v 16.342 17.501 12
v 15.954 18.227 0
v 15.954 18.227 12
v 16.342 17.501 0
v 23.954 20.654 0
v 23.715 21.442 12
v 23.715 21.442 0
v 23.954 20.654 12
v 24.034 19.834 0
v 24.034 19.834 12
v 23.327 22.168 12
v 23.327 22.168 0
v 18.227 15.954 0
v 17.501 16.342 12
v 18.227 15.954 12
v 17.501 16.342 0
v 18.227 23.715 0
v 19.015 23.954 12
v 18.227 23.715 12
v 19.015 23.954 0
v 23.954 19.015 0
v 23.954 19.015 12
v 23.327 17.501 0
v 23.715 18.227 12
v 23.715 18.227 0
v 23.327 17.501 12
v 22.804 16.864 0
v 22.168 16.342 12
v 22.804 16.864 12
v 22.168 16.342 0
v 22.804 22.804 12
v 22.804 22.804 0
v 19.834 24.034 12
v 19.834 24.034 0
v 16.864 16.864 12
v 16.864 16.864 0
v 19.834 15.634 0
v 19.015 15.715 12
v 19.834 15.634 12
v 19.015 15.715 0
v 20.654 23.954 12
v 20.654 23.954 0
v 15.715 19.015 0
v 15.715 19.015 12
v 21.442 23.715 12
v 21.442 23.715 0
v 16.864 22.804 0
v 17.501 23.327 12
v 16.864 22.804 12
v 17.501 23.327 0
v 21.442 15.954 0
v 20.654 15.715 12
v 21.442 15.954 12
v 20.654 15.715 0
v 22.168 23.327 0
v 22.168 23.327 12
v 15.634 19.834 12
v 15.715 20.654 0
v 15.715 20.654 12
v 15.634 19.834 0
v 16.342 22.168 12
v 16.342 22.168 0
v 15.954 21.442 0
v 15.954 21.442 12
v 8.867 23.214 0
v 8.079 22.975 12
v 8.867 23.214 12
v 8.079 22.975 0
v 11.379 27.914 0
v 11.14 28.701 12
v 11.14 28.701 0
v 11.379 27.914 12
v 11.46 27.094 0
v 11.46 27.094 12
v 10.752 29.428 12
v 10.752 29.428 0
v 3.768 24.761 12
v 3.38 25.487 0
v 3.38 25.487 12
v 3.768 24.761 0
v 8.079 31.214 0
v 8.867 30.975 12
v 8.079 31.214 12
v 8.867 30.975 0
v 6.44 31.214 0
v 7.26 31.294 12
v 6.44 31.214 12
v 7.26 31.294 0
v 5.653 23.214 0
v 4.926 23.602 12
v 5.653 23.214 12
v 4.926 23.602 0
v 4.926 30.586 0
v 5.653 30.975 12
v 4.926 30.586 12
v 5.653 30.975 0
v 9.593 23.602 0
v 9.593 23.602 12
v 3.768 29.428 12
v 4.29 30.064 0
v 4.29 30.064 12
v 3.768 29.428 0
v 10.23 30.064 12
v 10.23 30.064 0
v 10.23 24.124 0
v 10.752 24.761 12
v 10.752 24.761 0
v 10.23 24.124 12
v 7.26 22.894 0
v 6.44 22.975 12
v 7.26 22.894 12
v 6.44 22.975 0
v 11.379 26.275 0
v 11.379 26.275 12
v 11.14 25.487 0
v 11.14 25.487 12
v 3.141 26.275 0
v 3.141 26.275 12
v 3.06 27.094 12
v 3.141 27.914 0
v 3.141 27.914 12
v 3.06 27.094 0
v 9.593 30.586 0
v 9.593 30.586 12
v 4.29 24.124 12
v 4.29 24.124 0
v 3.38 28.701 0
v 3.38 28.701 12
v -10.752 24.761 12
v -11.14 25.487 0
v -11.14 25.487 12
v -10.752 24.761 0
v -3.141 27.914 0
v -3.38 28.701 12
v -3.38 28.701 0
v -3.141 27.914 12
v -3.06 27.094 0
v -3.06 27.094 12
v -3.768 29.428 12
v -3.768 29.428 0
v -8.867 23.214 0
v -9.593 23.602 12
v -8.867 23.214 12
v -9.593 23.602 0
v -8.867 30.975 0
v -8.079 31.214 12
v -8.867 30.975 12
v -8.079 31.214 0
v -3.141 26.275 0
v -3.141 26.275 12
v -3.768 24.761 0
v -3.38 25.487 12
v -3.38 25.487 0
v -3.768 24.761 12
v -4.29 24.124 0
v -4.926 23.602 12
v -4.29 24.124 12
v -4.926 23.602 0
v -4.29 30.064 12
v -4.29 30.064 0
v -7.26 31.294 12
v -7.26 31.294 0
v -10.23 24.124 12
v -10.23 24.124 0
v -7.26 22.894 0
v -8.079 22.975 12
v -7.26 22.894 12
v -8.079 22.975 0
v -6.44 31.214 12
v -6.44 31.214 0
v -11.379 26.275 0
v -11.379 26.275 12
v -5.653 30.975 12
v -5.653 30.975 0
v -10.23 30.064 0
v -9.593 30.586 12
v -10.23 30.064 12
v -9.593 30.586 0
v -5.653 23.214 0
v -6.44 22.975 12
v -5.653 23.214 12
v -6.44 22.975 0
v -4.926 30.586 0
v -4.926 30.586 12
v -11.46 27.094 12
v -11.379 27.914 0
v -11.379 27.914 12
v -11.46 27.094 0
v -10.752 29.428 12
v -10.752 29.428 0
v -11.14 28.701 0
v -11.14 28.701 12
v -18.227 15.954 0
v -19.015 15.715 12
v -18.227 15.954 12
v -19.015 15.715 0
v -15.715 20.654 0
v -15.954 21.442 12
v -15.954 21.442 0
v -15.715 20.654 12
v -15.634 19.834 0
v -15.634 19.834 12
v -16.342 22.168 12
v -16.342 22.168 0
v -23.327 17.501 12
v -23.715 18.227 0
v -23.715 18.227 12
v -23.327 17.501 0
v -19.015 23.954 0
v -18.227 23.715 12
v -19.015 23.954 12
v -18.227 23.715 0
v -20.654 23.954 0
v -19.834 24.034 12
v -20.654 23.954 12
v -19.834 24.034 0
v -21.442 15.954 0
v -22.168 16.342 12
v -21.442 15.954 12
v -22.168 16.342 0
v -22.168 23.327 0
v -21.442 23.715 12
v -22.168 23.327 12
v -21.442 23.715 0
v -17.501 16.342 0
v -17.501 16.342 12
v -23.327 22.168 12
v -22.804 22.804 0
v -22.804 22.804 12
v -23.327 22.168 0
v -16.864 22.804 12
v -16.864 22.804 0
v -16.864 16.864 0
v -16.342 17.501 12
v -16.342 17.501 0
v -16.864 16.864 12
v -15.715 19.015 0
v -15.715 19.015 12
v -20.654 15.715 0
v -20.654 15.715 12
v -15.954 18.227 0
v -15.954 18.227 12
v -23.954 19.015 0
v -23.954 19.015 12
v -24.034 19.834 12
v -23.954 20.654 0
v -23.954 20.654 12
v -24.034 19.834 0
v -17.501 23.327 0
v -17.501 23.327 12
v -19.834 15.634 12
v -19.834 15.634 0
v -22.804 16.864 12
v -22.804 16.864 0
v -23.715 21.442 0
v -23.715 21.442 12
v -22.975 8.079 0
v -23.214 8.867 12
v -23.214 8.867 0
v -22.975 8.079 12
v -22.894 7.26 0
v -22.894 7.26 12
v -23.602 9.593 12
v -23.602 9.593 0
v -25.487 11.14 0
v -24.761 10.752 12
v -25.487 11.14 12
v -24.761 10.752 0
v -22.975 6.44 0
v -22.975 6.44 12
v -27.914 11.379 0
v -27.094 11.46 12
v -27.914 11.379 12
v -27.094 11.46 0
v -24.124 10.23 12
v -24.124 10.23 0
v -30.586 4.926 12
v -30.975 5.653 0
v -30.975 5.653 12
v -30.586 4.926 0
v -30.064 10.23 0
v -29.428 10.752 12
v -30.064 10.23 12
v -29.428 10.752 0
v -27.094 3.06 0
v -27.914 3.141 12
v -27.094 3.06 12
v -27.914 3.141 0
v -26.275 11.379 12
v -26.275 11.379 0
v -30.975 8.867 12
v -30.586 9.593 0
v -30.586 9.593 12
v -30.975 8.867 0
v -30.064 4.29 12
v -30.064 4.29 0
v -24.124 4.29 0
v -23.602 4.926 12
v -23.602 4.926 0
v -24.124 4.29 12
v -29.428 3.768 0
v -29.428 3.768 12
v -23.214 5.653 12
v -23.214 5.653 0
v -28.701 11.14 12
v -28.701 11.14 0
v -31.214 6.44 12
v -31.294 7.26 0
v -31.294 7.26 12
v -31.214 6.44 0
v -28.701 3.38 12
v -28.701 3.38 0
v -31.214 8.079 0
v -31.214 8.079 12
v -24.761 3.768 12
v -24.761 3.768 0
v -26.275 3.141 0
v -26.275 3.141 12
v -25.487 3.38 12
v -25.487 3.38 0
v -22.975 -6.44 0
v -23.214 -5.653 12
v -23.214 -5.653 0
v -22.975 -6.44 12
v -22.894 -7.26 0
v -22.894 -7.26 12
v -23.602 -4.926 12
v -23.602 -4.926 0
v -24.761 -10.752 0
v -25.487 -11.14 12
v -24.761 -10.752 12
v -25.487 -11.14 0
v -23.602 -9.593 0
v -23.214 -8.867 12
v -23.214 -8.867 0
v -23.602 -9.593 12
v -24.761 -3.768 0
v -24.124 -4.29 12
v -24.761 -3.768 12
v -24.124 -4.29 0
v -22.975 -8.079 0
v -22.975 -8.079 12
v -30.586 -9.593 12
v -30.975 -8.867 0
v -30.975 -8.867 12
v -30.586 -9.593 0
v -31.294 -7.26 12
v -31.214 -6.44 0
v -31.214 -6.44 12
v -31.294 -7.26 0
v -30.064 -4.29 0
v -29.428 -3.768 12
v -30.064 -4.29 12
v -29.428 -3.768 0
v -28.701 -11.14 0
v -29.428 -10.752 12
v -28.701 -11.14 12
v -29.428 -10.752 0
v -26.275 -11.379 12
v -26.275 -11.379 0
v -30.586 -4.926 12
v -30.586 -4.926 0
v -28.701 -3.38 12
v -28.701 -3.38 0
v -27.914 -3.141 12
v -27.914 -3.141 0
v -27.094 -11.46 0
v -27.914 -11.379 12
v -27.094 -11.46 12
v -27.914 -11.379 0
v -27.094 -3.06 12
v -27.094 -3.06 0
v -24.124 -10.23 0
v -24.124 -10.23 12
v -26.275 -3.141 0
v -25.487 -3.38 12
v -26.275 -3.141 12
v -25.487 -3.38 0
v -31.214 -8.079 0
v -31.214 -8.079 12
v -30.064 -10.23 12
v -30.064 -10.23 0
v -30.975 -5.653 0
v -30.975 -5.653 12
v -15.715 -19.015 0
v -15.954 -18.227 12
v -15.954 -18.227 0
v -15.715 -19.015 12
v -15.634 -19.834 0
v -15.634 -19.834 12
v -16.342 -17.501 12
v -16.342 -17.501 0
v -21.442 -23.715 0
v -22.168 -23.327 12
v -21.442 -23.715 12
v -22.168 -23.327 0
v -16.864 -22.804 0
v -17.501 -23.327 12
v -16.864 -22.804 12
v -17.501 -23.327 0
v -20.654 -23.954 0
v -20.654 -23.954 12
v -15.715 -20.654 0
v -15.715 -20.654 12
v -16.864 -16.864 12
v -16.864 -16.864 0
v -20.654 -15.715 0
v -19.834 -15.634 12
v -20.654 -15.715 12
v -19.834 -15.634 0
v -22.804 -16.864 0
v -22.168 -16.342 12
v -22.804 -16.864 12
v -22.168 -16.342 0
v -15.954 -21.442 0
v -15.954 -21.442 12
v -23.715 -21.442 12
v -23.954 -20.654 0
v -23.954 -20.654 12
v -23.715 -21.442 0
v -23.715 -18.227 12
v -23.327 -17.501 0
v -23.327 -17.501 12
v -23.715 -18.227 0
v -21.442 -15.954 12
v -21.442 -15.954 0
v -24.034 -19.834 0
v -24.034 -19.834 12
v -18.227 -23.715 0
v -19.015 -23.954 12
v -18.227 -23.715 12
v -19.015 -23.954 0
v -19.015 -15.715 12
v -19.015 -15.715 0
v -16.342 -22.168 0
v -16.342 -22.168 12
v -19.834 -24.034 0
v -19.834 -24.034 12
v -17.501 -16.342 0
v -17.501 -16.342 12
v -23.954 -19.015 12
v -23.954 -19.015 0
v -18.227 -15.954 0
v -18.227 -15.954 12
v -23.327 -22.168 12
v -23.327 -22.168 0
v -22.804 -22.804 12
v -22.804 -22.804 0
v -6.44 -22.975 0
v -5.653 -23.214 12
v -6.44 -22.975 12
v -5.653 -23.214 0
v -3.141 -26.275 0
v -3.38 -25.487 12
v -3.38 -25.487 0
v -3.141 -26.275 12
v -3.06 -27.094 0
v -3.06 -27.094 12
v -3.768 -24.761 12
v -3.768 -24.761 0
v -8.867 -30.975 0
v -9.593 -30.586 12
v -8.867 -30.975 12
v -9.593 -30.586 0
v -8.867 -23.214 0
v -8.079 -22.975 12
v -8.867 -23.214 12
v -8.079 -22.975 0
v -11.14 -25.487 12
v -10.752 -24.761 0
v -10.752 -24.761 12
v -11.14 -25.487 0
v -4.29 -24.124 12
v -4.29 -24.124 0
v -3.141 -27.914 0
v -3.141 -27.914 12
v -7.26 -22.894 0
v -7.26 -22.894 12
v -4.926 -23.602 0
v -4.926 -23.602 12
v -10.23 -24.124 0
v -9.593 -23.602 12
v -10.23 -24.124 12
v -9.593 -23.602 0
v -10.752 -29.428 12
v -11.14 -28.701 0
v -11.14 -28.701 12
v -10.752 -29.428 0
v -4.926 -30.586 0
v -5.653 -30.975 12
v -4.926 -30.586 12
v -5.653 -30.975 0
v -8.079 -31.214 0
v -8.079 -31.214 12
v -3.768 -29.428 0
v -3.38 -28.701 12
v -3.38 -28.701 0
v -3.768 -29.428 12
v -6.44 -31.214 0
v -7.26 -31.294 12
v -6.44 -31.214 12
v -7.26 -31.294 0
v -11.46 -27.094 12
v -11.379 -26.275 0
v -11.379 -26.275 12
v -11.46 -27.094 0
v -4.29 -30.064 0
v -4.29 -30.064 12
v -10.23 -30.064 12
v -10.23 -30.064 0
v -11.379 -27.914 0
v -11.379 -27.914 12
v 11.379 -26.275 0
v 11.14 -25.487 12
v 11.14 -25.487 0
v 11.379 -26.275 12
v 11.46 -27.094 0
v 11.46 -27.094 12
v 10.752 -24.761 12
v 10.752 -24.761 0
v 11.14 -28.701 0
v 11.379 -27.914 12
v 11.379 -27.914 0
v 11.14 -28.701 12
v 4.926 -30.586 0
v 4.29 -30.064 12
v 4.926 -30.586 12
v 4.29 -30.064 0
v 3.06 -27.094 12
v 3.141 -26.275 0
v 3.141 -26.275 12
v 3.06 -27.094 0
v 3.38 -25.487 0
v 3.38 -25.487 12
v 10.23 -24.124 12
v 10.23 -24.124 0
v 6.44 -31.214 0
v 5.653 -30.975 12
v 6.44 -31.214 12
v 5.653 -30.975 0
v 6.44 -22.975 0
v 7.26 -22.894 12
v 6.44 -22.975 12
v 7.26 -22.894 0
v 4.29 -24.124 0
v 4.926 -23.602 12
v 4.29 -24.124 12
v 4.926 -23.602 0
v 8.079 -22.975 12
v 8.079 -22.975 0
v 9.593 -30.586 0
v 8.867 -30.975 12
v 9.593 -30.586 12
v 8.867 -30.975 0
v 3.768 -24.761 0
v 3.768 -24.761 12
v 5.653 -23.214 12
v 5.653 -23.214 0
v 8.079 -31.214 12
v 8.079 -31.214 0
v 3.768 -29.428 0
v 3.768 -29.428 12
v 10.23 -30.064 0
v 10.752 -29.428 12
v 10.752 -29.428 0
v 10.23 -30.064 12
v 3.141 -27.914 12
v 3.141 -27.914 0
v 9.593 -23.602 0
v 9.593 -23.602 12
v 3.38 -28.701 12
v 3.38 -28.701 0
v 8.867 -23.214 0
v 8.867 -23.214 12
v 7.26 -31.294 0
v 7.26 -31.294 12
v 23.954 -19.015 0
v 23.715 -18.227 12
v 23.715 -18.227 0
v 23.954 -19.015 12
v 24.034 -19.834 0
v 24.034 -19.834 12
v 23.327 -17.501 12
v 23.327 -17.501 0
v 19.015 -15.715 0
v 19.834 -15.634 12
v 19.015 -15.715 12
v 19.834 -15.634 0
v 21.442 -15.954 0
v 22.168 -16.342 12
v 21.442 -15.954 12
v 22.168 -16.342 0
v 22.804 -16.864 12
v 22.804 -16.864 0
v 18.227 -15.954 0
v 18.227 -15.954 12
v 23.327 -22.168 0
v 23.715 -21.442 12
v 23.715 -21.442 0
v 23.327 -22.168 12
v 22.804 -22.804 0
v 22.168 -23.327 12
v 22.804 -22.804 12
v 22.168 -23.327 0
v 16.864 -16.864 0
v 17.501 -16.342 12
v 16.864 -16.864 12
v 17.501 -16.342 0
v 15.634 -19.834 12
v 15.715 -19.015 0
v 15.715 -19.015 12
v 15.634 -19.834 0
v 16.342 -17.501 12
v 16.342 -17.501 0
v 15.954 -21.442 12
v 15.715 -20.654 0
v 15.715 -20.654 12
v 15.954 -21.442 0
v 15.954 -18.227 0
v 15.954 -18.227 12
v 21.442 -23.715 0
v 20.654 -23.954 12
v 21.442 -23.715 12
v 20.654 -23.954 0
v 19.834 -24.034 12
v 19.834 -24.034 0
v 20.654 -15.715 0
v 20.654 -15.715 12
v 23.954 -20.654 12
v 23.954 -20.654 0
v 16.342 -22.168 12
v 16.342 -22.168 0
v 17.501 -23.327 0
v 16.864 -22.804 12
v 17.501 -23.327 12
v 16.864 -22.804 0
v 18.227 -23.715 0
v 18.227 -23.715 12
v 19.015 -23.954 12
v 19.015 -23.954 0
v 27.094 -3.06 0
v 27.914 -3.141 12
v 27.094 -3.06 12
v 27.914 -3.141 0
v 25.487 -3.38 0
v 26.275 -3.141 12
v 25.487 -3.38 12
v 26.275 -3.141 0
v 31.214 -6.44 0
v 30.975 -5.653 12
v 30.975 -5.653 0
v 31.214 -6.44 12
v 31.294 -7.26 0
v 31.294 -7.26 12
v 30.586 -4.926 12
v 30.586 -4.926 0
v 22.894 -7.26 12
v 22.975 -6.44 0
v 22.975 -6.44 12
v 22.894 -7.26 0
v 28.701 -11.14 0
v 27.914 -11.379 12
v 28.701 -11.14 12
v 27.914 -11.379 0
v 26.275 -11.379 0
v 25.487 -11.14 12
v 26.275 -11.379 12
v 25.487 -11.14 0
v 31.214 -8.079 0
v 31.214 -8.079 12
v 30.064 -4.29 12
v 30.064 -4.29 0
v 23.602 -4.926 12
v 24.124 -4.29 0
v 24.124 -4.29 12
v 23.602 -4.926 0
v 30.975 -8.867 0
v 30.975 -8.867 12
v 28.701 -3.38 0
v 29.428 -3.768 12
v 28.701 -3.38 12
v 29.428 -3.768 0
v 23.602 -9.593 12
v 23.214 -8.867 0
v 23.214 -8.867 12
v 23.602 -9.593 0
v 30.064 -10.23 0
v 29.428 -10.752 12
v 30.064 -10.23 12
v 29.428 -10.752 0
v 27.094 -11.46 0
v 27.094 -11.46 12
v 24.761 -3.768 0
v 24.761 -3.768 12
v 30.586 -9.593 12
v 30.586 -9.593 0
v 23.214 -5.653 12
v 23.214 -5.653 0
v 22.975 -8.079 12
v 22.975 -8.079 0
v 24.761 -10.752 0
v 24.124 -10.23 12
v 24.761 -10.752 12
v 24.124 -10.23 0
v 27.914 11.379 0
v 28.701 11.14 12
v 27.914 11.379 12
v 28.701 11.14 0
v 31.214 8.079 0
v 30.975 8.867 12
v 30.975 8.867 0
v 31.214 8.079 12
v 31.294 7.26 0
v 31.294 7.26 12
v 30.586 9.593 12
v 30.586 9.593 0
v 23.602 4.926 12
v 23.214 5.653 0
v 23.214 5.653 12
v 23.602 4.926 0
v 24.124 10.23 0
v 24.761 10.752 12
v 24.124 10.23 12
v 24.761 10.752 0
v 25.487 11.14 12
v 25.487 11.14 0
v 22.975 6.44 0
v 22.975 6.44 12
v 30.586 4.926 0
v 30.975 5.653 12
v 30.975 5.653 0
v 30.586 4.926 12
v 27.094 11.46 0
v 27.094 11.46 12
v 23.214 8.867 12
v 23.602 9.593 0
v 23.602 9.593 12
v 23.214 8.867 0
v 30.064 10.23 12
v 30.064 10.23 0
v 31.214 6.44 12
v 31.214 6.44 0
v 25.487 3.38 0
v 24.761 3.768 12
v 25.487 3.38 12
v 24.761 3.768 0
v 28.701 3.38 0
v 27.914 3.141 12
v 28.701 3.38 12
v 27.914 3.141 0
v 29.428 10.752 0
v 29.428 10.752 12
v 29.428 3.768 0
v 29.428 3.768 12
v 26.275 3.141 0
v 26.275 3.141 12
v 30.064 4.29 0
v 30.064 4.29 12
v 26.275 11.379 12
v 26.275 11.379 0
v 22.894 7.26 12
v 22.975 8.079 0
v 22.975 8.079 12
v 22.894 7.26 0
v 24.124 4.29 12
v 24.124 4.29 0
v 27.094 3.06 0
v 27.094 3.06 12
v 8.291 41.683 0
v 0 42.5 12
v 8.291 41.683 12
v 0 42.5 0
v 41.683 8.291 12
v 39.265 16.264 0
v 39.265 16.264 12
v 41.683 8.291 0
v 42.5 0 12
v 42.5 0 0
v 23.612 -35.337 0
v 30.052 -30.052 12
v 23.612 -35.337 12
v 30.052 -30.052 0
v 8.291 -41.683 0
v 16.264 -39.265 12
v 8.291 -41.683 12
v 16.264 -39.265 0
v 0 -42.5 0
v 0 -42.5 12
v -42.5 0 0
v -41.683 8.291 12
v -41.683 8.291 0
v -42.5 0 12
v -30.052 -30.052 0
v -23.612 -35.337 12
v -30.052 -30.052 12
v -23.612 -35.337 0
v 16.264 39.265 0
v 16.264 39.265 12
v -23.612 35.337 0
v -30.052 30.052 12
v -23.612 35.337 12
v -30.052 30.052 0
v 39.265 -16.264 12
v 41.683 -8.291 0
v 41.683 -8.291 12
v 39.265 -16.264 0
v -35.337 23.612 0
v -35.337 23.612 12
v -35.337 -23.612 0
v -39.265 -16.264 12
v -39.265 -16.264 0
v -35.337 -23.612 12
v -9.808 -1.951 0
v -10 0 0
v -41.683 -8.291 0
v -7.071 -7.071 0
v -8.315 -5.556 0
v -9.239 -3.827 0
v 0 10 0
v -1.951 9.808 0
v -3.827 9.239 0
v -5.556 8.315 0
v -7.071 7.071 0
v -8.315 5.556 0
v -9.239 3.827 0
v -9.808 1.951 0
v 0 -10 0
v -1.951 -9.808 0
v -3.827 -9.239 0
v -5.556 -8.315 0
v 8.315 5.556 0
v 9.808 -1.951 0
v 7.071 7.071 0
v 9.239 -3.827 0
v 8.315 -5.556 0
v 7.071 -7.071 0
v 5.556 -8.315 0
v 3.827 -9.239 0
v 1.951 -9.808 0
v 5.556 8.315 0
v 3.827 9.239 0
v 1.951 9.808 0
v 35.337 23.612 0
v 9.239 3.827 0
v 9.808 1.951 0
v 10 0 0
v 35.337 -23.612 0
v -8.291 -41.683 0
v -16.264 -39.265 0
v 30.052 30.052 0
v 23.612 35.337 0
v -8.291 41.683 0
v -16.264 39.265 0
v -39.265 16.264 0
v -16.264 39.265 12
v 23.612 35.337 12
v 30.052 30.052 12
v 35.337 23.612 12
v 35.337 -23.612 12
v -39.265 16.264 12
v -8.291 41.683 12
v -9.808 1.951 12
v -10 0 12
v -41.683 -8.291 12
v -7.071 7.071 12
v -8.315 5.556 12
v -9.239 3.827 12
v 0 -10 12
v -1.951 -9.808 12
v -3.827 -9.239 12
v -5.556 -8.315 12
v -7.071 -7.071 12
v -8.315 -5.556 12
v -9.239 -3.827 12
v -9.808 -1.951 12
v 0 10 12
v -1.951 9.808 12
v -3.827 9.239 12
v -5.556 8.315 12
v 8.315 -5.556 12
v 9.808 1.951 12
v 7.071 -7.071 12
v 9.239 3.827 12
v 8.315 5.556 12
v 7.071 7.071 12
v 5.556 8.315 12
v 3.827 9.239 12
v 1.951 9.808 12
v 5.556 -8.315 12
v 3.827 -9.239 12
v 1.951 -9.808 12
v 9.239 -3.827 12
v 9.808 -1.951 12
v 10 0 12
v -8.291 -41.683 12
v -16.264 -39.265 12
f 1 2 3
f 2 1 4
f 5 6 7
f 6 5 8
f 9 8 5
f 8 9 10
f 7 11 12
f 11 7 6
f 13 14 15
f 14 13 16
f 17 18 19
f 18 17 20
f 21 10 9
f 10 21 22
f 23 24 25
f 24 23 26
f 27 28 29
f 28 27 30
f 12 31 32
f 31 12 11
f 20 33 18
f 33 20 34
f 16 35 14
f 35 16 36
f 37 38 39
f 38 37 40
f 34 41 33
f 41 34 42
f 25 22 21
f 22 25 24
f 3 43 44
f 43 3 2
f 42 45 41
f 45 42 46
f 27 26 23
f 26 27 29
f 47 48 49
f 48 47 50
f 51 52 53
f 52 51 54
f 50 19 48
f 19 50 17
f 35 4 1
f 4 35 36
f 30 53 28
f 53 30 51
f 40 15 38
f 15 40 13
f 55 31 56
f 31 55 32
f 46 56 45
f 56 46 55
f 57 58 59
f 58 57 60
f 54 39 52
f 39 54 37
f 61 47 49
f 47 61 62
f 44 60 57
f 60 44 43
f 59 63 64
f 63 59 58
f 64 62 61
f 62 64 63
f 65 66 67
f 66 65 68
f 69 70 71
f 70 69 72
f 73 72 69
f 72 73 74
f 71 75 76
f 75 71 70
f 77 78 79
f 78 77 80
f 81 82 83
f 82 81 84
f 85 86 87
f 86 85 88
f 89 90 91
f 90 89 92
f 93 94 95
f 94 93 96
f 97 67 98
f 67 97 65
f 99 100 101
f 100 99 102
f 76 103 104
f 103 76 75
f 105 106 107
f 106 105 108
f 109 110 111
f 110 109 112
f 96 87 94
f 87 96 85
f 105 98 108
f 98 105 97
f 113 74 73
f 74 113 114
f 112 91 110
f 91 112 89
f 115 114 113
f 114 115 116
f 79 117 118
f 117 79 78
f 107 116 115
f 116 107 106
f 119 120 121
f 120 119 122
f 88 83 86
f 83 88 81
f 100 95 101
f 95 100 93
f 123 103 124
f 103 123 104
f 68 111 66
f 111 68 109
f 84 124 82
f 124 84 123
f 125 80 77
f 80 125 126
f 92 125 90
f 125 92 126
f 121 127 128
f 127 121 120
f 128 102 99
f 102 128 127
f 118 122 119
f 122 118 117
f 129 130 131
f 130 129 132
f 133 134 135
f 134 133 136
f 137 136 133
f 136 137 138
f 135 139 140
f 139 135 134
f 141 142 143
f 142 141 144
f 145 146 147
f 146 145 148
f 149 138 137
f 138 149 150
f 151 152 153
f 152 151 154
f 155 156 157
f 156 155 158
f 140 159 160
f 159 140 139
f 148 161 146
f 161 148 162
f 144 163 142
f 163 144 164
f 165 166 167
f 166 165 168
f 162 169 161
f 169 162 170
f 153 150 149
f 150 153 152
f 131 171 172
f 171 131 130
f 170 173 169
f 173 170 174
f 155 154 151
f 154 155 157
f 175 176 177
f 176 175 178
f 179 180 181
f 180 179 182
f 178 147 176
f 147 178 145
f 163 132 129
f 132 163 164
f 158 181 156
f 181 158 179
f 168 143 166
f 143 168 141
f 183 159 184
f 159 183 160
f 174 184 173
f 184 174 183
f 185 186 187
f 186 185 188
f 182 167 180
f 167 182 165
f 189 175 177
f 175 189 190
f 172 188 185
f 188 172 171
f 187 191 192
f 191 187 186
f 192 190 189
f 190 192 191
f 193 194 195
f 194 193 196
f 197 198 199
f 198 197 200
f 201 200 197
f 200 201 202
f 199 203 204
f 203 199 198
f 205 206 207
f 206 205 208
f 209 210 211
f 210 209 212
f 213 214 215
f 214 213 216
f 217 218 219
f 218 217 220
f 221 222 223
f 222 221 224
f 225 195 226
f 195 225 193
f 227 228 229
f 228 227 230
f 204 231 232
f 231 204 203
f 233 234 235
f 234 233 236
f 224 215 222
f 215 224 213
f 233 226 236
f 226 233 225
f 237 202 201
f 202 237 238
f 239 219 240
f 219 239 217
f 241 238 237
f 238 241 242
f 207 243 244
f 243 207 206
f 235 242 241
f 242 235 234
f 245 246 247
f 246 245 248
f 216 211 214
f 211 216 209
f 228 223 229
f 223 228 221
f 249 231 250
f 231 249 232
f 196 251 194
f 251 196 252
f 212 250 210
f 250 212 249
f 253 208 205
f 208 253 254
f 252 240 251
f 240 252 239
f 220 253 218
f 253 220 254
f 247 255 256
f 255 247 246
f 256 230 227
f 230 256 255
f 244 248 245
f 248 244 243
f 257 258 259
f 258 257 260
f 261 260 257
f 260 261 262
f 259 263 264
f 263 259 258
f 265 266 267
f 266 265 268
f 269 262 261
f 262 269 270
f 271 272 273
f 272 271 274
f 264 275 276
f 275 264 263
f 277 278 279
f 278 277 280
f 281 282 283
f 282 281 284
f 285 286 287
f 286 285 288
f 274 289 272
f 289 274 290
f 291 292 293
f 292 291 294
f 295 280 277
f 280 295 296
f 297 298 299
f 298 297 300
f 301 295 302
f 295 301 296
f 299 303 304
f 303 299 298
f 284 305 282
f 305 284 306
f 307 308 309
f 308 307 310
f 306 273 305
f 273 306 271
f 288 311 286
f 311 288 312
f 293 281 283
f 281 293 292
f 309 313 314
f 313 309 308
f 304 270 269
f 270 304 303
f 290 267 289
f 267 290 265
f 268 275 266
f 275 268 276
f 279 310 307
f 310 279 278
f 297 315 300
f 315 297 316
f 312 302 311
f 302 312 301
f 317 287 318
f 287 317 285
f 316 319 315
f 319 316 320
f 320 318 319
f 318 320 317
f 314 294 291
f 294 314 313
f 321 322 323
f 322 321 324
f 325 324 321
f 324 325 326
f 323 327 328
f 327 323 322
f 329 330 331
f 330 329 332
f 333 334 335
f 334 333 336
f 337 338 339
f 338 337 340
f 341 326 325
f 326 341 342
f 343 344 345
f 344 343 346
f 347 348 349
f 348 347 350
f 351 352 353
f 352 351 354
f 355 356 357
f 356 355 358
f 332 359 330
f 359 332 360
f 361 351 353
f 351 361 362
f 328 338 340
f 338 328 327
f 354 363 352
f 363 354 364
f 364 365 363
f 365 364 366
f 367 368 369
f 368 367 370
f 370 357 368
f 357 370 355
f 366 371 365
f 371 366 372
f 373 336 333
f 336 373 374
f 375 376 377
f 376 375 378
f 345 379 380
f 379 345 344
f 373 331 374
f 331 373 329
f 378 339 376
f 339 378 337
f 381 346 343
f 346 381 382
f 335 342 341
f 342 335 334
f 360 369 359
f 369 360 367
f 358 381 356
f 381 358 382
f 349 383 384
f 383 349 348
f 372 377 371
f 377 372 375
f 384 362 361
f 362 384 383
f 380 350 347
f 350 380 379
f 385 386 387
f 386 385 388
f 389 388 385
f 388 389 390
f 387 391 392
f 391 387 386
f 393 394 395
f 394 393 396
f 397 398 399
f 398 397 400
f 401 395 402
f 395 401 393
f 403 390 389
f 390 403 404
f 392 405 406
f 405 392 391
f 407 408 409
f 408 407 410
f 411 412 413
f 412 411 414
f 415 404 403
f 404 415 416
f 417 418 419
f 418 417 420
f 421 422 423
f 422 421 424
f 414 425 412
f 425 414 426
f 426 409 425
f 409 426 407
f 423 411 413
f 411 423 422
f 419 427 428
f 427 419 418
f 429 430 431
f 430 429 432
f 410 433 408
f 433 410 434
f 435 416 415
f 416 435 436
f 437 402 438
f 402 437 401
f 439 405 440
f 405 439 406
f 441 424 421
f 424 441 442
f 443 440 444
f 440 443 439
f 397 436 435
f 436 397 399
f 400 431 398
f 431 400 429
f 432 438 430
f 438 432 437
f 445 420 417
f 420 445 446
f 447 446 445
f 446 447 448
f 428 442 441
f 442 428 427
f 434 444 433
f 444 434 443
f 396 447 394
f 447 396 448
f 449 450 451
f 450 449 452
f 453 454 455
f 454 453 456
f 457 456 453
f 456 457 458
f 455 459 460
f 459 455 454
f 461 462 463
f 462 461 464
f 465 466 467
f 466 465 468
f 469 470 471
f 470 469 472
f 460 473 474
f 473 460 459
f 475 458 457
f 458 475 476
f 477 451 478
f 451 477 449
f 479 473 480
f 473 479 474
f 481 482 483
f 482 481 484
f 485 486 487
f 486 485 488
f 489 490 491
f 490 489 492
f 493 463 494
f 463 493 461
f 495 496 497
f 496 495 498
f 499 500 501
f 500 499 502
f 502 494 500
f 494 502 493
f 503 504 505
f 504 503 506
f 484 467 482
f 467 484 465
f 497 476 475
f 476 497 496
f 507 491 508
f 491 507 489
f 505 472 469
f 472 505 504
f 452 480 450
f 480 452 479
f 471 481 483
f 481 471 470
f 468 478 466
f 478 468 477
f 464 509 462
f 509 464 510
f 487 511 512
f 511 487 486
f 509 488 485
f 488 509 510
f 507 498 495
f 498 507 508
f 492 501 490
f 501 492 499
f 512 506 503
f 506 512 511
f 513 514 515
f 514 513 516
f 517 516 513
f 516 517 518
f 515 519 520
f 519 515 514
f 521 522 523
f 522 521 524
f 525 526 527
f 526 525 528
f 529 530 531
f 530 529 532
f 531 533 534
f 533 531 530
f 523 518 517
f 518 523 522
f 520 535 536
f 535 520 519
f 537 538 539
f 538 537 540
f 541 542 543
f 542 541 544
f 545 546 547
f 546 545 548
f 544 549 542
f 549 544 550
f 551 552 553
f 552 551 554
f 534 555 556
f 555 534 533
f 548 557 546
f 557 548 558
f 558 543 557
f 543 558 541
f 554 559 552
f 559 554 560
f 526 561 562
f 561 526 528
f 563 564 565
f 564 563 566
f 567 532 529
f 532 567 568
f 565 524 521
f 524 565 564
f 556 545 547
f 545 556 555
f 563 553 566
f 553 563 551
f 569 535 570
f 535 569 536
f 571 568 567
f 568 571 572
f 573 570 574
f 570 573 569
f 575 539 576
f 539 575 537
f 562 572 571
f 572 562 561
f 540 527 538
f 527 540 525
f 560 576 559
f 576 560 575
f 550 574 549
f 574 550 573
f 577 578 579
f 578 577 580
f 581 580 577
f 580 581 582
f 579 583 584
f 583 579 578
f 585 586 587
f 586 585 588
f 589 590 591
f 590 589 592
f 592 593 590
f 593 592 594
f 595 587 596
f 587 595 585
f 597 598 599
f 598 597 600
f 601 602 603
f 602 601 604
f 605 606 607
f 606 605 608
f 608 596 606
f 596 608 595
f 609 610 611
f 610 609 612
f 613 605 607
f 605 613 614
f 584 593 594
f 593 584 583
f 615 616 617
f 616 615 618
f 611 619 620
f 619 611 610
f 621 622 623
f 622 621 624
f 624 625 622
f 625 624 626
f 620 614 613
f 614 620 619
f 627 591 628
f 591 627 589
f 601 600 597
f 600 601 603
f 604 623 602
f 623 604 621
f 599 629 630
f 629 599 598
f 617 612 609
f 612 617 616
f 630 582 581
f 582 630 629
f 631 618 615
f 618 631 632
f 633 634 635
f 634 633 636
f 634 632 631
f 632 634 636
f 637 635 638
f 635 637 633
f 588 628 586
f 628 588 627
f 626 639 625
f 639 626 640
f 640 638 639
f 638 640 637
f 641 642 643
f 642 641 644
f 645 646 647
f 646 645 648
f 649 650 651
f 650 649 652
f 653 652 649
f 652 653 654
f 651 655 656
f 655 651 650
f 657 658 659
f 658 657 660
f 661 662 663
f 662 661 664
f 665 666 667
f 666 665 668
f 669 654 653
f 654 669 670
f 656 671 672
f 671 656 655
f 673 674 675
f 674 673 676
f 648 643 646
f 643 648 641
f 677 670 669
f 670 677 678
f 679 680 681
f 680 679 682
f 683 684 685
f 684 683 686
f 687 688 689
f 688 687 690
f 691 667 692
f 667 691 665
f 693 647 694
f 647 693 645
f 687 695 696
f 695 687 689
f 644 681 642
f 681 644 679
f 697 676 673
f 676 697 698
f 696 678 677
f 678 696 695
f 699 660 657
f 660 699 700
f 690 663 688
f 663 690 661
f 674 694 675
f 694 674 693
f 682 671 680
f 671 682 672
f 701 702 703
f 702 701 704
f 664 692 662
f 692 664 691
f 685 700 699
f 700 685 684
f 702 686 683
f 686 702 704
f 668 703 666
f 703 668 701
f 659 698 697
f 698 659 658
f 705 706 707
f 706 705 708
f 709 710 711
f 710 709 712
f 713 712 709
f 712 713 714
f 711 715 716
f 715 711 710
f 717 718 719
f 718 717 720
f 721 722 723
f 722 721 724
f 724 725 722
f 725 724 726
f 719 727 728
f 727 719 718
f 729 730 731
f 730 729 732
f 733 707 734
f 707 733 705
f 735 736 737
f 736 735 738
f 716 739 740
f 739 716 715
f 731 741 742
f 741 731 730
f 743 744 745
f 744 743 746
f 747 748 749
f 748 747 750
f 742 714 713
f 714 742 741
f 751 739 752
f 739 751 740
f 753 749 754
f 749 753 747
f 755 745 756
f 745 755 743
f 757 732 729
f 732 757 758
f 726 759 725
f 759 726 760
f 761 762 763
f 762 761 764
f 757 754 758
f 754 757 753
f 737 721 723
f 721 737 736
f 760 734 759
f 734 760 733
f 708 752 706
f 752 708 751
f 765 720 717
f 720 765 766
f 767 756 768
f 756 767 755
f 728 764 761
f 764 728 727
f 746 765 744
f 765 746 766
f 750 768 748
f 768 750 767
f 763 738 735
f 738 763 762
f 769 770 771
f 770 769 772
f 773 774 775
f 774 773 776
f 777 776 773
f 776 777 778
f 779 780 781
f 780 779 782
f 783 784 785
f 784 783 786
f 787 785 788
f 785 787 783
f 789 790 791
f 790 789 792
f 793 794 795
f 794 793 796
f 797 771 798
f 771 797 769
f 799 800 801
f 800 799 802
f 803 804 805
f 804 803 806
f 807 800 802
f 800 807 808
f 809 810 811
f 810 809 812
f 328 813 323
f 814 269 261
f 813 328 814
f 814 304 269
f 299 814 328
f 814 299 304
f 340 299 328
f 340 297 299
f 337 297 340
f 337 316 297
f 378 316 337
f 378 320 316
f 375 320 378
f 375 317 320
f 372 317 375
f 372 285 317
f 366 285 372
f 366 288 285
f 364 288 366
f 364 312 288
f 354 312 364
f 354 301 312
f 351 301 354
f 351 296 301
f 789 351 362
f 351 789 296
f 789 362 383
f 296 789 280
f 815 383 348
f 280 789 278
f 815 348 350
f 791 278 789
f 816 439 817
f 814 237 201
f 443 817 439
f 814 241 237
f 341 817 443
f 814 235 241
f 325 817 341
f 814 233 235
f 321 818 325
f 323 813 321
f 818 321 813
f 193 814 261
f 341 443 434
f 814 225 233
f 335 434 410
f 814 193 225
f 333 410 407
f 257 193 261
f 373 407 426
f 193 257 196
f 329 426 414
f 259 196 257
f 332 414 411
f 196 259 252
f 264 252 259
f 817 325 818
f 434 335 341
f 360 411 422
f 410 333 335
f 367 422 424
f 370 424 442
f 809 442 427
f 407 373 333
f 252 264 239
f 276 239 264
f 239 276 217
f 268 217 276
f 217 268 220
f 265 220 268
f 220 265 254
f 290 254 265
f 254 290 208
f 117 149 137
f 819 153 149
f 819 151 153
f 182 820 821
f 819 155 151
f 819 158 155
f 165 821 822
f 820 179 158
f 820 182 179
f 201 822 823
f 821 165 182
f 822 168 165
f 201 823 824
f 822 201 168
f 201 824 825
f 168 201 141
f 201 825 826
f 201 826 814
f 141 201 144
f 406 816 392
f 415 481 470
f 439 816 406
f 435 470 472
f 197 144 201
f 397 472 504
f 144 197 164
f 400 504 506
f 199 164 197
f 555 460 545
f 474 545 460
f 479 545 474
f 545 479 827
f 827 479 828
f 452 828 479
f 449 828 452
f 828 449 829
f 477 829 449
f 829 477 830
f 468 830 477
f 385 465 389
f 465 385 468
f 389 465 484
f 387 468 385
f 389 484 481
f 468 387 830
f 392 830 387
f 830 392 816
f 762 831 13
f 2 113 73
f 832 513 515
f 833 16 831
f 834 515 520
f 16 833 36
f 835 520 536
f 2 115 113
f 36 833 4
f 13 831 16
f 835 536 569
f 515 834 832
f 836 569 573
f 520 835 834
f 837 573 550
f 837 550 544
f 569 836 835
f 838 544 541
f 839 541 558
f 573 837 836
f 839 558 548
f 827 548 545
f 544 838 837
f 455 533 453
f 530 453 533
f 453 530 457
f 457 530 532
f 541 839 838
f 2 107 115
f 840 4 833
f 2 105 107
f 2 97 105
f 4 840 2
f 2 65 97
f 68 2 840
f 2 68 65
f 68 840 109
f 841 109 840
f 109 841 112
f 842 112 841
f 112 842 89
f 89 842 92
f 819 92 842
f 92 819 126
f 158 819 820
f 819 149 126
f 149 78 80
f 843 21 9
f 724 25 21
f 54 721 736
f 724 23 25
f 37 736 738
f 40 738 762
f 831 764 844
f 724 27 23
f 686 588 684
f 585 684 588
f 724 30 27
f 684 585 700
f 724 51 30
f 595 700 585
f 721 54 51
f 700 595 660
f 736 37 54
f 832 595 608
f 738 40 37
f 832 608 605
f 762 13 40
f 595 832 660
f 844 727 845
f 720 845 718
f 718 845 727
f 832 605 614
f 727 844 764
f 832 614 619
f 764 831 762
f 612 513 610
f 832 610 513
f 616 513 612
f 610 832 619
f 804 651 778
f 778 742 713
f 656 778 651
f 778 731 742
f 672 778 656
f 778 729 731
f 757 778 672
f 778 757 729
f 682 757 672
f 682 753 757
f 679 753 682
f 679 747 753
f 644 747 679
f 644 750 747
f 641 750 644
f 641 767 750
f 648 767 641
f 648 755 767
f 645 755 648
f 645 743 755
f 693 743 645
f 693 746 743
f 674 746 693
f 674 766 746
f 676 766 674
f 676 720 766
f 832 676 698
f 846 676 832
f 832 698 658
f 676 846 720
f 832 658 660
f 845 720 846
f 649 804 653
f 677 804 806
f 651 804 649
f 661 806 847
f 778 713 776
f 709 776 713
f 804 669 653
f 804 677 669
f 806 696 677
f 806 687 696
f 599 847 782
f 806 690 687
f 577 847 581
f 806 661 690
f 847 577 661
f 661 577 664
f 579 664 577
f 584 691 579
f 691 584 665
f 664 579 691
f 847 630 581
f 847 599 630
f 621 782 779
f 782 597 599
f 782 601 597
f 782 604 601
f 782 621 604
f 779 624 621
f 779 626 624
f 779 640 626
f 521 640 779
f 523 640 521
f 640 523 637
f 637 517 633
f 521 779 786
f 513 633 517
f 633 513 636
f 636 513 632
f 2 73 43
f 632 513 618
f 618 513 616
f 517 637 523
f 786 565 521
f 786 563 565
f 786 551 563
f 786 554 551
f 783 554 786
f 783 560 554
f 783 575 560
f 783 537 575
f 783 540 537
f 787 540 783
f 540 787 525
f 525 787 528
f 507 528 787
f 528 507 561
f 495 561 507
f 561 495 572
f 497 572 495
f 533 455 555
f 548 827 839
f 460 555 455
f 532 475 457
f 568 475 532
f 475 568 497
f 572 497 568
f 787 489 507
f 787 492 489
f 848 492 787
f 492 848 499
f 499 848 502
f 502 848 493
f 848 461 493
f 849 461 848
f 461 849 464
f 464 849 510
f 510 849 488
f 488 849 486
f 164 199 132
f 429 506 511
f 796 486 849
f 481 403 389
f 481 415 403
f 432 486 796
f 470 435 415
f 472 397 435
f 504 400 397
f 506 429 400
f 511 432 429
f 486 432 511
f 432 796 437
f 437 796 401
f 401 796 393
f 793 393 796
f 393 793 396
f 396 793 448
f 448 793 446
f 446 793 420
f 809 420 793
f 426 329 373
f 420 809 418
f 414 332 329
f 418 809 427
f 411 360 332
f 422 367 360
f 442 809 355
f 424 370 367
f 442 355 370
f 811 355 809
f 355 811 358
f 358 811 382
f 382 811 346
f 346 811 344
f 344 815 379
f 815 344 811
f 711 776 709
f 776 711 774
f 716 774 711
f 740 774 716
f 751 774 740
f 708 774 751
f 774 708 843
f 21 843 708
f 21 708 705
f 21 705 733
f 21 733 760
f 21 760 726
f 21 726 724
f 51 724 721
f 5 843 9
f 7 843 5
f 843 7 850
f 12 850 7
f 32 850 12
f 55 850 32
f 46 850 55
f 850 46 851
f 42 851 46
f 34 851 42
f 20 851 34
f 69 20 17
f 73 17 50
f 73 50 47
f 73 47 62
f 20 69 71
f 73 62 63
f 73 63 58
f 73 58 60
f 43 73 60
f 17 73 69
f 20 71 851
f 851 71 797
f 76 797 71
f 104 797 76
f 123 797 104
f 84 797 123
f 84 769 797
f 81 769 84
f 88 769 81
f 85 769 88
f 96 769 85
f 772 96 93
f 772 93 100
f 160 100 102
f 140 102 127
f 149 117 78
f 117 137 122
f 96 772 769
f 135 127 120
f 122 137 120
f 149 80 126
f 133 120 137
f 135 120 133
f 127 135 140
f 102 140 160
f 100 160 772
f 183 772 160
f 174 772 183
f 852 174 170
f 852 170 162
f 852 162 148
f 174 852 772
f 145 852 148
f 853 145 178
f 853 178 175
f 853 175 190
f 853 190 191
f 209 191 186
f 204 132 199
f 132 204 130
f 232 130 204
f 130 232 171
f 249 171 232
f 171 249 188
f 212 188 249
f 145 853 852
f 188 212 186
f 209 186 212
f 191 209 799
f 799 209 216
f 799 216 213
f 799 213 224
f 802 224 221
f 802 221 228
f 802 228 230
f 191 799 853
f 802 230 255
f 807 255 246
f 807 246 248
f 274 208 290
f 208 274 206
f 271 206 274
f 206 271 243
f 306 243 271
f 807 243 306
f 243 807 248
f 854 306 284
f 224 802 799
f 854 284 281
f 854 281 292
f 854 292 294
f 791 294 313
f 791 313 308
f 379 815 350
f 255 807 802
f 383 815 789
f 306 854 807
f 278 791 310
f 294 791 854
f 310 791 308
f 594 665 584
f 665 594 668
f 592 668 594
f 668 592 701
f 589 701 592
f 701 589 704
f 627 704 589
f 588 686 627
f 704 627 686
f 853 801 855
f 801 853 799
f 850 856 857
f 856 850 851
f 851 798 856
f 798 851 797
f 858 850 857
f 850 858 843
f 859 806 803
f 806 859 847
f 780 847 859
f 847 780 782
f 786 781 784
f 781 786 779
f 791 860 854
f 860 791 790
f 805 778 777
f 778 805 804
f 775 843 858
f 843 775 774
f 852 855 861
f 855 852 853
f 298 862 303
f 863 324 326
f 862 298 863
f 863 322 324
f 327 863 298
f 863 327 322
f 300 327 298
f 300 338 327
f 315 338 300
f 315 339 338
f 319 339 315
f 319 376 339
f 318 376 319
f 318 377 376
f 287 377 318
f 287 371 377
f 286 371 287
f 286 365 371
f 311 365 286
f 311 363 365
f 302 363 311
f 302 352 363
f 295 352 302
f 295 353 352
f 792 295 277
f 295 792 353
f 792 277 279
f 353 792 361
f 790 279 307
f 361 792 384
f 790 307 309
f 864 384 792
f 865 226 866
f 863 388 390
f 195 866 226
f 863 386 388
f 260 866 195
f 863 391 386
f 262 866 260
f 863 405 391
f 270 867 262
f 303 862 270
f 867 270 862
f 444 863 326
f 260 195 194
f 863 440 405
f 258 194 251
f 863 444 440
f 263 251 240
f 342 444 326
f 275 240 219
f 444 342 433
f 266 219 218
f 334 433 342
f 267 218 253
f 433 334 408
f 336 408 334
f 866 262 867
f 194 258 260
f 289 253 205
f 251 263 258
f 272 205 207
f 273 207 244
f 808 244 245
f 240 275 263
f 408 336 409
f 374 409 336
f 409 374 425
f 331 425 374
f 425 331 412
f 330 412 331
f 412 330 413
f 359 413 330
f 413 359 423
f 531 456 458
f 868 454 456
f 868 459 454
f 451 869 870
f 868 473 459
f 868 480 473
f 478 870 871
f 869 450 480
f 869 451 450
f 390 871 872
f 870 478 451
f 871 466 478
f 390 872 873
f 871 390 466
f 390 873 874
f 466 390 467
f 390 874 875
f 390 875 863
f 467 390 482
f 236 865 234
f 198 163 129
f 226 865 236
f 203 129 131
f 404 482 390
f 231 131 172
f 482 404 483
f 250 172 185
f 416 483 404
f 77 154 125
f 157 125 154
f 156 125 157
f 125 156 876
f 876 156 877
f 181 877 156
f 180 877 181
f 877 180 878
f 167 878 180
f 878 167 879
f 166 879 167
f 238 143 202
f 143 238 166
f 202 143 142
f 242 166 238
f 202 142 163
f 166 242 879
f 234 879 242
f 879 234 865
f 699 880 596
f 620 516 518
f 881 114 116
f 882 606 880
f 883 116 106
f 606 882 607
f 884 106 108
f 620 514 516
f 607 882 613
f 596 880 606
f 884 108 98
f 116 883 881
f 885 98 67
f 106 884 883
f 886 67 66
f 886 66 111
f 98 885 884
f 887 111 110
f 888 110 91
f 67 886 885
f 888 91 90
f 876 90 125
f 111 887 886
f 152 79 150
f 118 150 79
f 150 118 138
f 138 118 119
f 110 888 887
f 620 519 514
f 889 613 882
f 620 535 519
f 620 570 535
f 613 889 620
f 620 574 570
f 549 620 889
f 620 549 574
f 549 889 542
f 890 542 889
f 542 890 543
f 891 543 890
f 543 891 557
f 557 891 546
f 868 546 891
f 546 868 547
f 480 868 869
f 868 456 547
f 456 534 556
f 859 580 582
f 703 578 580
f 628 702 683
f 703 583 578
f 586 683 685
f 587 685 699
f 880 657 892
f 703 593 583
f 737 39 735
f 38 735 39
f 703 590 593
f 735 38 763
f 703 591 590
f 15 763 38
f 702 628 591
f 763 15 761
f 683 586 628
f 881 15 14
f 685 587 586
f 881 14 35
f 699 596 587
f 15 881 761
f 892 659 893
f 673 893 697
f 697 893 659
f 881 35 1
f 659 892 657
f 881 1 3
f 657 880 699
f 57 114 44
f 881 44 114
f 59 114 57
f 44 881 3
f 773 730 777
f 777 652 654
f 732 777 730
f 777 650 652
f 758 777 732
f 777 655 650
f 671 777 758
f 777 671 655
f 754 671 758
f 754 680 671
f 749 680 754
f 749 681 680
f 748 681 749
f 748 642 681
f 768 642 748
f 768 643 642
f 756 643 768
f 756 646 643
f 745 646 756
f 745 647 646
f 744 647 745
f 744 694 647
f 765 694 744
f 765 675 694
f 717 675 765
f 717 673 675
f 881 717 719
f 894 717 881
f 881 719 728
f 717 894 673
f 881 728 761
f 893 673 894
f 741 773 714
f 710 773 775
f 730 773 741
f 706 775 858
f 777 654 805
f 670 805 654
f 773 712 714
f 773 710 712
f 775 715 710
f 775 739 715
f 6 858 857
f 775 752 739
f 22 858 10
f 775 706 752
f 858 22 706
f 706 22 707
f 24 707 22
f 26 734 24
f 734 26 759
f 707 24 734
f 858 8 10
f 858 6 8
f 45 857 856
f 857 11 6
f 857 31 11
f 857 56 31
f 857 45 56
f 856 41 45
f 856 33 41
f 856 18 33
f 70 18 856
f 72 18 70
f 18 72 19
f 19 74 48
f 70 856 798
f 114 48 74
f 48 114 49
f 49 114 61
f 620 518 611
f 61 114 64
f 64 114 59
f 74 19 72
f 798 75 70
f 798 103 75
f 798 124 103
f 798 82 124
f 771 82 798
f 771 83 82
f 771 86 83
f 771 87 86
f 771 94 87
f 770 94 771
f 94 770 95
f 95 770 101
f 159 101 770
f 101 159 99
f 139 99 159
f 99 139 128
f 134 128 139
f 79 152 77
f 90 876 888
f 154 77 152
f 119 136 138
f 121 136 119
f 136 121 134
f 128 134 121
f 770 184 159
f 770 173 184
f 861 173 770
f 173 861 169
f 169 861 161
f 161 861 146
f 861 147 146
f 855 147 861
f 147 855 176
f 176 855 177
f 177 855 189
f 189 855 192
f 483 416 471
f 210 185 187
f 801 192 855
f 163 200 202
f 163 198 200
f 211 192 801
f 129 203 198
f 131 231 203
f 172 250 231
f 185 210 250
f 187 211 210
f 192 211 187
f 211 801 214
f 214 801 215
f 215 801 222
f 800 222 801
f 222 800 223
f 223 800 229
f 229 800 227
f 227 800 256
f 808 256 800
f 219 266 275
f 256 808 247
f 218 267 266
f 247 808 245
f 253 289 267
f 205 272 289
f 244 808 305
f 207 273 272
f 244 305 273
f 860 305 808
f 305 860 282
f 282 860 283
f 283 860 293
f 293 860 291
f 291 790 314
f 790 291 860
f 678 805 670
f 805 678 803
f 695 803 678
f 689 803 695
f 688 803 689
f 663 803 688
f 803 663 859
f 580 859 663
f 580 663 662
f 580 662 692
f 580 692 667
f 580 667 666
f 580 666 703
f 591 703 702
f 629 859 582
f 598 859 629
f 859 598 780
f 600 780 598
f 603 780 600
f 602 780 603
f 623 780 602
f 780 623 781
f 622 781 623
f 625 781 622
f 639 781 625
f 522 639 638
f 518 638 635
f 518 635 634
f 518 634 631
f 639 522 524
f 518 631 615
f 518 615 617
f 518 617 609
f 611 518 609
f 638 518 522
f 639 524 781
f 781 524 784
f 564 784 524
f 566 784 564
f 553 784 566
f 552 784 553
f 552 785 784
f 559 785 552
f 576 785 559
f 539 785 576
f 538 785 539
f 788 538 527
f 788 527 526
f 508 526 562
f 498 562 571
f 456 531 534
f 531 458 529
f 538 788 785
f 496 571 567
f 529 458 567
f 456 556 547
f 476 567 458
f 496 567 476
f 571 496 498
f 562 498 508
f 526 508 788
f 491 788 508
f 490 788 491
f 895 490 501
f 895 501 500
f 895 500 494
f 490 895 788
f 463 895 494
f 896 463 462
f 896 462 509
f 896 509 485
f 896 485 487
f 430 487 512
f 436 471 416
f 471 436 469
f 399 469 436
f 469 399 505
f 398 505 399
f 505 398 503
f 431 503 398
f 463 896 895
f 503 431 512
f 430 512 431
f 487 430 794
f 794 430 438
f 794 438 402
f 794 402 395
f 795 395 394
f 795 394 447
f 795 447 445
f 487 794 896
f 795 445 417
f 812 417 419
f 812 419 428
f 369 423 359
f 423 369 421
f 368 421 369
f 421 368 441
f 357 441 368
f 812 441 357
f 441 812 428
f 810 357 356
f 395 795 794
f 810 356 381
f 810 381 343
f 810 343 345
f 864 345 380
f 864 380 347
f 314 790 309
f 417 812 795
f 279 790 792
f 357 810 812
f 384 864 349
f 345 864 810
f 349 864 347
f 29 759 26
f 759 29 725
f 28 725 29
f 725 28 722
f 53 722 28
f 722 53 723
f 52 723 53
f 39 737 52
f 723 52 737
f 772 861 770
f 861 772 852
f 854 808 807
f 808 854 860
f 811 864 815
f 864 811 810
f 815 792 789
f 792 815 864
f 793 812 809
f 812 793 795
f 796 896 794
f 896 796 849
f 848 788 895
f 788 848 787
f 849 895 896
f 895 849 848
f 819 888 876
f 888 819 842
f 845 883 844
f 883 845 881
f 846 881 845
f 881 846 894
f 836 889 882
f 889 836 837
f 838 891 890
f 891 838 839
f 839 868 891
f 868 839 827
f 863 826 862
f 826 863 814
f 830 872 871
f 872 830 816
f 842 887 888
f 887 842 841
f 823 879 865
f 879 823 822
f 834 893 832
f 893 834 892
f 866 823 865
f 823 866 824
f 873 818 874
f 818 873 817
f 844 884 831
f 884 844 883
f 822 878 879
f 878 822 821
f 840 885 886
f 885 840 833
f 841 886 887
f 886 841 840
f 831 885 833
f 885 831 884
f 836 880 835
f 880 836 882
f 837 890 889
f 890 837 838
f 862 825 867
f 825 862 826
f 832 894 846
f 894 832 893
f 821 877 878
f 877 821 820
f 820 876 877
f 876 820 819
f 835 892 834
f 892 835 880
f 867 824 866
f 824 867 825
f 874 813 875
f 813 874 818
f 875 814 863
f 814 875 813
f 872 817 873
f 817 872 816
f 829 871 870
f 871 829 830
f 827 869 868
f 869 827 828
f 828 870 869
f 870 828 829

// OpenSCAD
$fn = 32;

// ----------------------------------------------------------------------
// Flange Ø85 x 12
// 12 holes on a Ø56.1 bolt circle, bolted joints
// ----------------------------------------------------------------------

// --- parameters (mm) ---
flange_d = 85;   // outside diameter of the flange
thickness = 12;  // flange thickness
holes = 12;      // number of bolt holes
pcd = 56.1;      // bolt circle diameter
start_deg = 45;  // angle of the first hole, from +X
hole_d = 8.4;    // bolt hole diameter
bore_d = 20;     // central through bore
hub_d = 28;      // hub outside diameter
hub_h = 0;       // hub height above the flange face (0 = no hub)

// --- derived feature positions (mm) ---
height = thickness + hub_h;  // = 12   overall height of the part
pcd_r = pcd / 2;             // = 28.05   bolt circle radius
hole_step = 360 / holes;     // = 30   angular pitch
feature_centers = [
  [pcd_r * cos(start_deg + 0 * hole_step), pcd_r * sin(start_deg + 0 * hole_step)],
  [pcd_r * cos(start_deg + 1 * hole_step), pcd_r * sin(start_deg + 1 * hole_step)],
  [pcd_r * cos(start_deg + 2 * hole_step), pcd_r * sin(start_deg + 2 * hole_step)],
  [pcd_r * cos(start_deg + 3 * hole_step), pcd_r * sin(start_deg + 3 * hole_step)],
  [pcd_r * cos(start_deg + 4 * hole_step), pcd_r * sin(start_deg + 4 * hole_step)],
  [pcd_r * cos(start_deg + 5 * hole_step), pcd_r * sin(start_deg + 5 * hole_step)],
  [pcd_r * cos(start_deg + 6 * hole_step), pcd_r * sin(start_deg + 6 * hole_step)],
  [pcd_r * cos(start_deg + 7 * hole_step), pcd_r * sin(start_deg + 7 * hole_step)],
  [pcd_r * cos(start_deg + 8 * hole_step), pcd_r * sin(start_deg + 8 * hole_step)],
  [pcd_r * cos(start_deg + 9 * hole_step), pcd_r * sin(start_deg + 9 * hole_step)],
  [pcd_r * cos(start_deg + 10 * hole_step), pcd_r * sin(start_deg + 10 * hole_step)],
  [pcd_r * cos(start_deg + 11 * hole_step), pcd_r * sin(start_deg + 11 * hole_step)]
];   // bolt hole centres on the pitch circle

// flange disc, every hole and the bore cut straight through
difference() {
  union() {
    cylinder(d = flange_d, h = thickness);
  }
  translate([0, 0, -1]) cylinder(d = bore_d, h = height + 2);  // bore, through
  for (centre = feature_centers)
    translate([centre[0], centre[1], -1]) cylinder(d = hole_d, h = thickness + 2);
}
